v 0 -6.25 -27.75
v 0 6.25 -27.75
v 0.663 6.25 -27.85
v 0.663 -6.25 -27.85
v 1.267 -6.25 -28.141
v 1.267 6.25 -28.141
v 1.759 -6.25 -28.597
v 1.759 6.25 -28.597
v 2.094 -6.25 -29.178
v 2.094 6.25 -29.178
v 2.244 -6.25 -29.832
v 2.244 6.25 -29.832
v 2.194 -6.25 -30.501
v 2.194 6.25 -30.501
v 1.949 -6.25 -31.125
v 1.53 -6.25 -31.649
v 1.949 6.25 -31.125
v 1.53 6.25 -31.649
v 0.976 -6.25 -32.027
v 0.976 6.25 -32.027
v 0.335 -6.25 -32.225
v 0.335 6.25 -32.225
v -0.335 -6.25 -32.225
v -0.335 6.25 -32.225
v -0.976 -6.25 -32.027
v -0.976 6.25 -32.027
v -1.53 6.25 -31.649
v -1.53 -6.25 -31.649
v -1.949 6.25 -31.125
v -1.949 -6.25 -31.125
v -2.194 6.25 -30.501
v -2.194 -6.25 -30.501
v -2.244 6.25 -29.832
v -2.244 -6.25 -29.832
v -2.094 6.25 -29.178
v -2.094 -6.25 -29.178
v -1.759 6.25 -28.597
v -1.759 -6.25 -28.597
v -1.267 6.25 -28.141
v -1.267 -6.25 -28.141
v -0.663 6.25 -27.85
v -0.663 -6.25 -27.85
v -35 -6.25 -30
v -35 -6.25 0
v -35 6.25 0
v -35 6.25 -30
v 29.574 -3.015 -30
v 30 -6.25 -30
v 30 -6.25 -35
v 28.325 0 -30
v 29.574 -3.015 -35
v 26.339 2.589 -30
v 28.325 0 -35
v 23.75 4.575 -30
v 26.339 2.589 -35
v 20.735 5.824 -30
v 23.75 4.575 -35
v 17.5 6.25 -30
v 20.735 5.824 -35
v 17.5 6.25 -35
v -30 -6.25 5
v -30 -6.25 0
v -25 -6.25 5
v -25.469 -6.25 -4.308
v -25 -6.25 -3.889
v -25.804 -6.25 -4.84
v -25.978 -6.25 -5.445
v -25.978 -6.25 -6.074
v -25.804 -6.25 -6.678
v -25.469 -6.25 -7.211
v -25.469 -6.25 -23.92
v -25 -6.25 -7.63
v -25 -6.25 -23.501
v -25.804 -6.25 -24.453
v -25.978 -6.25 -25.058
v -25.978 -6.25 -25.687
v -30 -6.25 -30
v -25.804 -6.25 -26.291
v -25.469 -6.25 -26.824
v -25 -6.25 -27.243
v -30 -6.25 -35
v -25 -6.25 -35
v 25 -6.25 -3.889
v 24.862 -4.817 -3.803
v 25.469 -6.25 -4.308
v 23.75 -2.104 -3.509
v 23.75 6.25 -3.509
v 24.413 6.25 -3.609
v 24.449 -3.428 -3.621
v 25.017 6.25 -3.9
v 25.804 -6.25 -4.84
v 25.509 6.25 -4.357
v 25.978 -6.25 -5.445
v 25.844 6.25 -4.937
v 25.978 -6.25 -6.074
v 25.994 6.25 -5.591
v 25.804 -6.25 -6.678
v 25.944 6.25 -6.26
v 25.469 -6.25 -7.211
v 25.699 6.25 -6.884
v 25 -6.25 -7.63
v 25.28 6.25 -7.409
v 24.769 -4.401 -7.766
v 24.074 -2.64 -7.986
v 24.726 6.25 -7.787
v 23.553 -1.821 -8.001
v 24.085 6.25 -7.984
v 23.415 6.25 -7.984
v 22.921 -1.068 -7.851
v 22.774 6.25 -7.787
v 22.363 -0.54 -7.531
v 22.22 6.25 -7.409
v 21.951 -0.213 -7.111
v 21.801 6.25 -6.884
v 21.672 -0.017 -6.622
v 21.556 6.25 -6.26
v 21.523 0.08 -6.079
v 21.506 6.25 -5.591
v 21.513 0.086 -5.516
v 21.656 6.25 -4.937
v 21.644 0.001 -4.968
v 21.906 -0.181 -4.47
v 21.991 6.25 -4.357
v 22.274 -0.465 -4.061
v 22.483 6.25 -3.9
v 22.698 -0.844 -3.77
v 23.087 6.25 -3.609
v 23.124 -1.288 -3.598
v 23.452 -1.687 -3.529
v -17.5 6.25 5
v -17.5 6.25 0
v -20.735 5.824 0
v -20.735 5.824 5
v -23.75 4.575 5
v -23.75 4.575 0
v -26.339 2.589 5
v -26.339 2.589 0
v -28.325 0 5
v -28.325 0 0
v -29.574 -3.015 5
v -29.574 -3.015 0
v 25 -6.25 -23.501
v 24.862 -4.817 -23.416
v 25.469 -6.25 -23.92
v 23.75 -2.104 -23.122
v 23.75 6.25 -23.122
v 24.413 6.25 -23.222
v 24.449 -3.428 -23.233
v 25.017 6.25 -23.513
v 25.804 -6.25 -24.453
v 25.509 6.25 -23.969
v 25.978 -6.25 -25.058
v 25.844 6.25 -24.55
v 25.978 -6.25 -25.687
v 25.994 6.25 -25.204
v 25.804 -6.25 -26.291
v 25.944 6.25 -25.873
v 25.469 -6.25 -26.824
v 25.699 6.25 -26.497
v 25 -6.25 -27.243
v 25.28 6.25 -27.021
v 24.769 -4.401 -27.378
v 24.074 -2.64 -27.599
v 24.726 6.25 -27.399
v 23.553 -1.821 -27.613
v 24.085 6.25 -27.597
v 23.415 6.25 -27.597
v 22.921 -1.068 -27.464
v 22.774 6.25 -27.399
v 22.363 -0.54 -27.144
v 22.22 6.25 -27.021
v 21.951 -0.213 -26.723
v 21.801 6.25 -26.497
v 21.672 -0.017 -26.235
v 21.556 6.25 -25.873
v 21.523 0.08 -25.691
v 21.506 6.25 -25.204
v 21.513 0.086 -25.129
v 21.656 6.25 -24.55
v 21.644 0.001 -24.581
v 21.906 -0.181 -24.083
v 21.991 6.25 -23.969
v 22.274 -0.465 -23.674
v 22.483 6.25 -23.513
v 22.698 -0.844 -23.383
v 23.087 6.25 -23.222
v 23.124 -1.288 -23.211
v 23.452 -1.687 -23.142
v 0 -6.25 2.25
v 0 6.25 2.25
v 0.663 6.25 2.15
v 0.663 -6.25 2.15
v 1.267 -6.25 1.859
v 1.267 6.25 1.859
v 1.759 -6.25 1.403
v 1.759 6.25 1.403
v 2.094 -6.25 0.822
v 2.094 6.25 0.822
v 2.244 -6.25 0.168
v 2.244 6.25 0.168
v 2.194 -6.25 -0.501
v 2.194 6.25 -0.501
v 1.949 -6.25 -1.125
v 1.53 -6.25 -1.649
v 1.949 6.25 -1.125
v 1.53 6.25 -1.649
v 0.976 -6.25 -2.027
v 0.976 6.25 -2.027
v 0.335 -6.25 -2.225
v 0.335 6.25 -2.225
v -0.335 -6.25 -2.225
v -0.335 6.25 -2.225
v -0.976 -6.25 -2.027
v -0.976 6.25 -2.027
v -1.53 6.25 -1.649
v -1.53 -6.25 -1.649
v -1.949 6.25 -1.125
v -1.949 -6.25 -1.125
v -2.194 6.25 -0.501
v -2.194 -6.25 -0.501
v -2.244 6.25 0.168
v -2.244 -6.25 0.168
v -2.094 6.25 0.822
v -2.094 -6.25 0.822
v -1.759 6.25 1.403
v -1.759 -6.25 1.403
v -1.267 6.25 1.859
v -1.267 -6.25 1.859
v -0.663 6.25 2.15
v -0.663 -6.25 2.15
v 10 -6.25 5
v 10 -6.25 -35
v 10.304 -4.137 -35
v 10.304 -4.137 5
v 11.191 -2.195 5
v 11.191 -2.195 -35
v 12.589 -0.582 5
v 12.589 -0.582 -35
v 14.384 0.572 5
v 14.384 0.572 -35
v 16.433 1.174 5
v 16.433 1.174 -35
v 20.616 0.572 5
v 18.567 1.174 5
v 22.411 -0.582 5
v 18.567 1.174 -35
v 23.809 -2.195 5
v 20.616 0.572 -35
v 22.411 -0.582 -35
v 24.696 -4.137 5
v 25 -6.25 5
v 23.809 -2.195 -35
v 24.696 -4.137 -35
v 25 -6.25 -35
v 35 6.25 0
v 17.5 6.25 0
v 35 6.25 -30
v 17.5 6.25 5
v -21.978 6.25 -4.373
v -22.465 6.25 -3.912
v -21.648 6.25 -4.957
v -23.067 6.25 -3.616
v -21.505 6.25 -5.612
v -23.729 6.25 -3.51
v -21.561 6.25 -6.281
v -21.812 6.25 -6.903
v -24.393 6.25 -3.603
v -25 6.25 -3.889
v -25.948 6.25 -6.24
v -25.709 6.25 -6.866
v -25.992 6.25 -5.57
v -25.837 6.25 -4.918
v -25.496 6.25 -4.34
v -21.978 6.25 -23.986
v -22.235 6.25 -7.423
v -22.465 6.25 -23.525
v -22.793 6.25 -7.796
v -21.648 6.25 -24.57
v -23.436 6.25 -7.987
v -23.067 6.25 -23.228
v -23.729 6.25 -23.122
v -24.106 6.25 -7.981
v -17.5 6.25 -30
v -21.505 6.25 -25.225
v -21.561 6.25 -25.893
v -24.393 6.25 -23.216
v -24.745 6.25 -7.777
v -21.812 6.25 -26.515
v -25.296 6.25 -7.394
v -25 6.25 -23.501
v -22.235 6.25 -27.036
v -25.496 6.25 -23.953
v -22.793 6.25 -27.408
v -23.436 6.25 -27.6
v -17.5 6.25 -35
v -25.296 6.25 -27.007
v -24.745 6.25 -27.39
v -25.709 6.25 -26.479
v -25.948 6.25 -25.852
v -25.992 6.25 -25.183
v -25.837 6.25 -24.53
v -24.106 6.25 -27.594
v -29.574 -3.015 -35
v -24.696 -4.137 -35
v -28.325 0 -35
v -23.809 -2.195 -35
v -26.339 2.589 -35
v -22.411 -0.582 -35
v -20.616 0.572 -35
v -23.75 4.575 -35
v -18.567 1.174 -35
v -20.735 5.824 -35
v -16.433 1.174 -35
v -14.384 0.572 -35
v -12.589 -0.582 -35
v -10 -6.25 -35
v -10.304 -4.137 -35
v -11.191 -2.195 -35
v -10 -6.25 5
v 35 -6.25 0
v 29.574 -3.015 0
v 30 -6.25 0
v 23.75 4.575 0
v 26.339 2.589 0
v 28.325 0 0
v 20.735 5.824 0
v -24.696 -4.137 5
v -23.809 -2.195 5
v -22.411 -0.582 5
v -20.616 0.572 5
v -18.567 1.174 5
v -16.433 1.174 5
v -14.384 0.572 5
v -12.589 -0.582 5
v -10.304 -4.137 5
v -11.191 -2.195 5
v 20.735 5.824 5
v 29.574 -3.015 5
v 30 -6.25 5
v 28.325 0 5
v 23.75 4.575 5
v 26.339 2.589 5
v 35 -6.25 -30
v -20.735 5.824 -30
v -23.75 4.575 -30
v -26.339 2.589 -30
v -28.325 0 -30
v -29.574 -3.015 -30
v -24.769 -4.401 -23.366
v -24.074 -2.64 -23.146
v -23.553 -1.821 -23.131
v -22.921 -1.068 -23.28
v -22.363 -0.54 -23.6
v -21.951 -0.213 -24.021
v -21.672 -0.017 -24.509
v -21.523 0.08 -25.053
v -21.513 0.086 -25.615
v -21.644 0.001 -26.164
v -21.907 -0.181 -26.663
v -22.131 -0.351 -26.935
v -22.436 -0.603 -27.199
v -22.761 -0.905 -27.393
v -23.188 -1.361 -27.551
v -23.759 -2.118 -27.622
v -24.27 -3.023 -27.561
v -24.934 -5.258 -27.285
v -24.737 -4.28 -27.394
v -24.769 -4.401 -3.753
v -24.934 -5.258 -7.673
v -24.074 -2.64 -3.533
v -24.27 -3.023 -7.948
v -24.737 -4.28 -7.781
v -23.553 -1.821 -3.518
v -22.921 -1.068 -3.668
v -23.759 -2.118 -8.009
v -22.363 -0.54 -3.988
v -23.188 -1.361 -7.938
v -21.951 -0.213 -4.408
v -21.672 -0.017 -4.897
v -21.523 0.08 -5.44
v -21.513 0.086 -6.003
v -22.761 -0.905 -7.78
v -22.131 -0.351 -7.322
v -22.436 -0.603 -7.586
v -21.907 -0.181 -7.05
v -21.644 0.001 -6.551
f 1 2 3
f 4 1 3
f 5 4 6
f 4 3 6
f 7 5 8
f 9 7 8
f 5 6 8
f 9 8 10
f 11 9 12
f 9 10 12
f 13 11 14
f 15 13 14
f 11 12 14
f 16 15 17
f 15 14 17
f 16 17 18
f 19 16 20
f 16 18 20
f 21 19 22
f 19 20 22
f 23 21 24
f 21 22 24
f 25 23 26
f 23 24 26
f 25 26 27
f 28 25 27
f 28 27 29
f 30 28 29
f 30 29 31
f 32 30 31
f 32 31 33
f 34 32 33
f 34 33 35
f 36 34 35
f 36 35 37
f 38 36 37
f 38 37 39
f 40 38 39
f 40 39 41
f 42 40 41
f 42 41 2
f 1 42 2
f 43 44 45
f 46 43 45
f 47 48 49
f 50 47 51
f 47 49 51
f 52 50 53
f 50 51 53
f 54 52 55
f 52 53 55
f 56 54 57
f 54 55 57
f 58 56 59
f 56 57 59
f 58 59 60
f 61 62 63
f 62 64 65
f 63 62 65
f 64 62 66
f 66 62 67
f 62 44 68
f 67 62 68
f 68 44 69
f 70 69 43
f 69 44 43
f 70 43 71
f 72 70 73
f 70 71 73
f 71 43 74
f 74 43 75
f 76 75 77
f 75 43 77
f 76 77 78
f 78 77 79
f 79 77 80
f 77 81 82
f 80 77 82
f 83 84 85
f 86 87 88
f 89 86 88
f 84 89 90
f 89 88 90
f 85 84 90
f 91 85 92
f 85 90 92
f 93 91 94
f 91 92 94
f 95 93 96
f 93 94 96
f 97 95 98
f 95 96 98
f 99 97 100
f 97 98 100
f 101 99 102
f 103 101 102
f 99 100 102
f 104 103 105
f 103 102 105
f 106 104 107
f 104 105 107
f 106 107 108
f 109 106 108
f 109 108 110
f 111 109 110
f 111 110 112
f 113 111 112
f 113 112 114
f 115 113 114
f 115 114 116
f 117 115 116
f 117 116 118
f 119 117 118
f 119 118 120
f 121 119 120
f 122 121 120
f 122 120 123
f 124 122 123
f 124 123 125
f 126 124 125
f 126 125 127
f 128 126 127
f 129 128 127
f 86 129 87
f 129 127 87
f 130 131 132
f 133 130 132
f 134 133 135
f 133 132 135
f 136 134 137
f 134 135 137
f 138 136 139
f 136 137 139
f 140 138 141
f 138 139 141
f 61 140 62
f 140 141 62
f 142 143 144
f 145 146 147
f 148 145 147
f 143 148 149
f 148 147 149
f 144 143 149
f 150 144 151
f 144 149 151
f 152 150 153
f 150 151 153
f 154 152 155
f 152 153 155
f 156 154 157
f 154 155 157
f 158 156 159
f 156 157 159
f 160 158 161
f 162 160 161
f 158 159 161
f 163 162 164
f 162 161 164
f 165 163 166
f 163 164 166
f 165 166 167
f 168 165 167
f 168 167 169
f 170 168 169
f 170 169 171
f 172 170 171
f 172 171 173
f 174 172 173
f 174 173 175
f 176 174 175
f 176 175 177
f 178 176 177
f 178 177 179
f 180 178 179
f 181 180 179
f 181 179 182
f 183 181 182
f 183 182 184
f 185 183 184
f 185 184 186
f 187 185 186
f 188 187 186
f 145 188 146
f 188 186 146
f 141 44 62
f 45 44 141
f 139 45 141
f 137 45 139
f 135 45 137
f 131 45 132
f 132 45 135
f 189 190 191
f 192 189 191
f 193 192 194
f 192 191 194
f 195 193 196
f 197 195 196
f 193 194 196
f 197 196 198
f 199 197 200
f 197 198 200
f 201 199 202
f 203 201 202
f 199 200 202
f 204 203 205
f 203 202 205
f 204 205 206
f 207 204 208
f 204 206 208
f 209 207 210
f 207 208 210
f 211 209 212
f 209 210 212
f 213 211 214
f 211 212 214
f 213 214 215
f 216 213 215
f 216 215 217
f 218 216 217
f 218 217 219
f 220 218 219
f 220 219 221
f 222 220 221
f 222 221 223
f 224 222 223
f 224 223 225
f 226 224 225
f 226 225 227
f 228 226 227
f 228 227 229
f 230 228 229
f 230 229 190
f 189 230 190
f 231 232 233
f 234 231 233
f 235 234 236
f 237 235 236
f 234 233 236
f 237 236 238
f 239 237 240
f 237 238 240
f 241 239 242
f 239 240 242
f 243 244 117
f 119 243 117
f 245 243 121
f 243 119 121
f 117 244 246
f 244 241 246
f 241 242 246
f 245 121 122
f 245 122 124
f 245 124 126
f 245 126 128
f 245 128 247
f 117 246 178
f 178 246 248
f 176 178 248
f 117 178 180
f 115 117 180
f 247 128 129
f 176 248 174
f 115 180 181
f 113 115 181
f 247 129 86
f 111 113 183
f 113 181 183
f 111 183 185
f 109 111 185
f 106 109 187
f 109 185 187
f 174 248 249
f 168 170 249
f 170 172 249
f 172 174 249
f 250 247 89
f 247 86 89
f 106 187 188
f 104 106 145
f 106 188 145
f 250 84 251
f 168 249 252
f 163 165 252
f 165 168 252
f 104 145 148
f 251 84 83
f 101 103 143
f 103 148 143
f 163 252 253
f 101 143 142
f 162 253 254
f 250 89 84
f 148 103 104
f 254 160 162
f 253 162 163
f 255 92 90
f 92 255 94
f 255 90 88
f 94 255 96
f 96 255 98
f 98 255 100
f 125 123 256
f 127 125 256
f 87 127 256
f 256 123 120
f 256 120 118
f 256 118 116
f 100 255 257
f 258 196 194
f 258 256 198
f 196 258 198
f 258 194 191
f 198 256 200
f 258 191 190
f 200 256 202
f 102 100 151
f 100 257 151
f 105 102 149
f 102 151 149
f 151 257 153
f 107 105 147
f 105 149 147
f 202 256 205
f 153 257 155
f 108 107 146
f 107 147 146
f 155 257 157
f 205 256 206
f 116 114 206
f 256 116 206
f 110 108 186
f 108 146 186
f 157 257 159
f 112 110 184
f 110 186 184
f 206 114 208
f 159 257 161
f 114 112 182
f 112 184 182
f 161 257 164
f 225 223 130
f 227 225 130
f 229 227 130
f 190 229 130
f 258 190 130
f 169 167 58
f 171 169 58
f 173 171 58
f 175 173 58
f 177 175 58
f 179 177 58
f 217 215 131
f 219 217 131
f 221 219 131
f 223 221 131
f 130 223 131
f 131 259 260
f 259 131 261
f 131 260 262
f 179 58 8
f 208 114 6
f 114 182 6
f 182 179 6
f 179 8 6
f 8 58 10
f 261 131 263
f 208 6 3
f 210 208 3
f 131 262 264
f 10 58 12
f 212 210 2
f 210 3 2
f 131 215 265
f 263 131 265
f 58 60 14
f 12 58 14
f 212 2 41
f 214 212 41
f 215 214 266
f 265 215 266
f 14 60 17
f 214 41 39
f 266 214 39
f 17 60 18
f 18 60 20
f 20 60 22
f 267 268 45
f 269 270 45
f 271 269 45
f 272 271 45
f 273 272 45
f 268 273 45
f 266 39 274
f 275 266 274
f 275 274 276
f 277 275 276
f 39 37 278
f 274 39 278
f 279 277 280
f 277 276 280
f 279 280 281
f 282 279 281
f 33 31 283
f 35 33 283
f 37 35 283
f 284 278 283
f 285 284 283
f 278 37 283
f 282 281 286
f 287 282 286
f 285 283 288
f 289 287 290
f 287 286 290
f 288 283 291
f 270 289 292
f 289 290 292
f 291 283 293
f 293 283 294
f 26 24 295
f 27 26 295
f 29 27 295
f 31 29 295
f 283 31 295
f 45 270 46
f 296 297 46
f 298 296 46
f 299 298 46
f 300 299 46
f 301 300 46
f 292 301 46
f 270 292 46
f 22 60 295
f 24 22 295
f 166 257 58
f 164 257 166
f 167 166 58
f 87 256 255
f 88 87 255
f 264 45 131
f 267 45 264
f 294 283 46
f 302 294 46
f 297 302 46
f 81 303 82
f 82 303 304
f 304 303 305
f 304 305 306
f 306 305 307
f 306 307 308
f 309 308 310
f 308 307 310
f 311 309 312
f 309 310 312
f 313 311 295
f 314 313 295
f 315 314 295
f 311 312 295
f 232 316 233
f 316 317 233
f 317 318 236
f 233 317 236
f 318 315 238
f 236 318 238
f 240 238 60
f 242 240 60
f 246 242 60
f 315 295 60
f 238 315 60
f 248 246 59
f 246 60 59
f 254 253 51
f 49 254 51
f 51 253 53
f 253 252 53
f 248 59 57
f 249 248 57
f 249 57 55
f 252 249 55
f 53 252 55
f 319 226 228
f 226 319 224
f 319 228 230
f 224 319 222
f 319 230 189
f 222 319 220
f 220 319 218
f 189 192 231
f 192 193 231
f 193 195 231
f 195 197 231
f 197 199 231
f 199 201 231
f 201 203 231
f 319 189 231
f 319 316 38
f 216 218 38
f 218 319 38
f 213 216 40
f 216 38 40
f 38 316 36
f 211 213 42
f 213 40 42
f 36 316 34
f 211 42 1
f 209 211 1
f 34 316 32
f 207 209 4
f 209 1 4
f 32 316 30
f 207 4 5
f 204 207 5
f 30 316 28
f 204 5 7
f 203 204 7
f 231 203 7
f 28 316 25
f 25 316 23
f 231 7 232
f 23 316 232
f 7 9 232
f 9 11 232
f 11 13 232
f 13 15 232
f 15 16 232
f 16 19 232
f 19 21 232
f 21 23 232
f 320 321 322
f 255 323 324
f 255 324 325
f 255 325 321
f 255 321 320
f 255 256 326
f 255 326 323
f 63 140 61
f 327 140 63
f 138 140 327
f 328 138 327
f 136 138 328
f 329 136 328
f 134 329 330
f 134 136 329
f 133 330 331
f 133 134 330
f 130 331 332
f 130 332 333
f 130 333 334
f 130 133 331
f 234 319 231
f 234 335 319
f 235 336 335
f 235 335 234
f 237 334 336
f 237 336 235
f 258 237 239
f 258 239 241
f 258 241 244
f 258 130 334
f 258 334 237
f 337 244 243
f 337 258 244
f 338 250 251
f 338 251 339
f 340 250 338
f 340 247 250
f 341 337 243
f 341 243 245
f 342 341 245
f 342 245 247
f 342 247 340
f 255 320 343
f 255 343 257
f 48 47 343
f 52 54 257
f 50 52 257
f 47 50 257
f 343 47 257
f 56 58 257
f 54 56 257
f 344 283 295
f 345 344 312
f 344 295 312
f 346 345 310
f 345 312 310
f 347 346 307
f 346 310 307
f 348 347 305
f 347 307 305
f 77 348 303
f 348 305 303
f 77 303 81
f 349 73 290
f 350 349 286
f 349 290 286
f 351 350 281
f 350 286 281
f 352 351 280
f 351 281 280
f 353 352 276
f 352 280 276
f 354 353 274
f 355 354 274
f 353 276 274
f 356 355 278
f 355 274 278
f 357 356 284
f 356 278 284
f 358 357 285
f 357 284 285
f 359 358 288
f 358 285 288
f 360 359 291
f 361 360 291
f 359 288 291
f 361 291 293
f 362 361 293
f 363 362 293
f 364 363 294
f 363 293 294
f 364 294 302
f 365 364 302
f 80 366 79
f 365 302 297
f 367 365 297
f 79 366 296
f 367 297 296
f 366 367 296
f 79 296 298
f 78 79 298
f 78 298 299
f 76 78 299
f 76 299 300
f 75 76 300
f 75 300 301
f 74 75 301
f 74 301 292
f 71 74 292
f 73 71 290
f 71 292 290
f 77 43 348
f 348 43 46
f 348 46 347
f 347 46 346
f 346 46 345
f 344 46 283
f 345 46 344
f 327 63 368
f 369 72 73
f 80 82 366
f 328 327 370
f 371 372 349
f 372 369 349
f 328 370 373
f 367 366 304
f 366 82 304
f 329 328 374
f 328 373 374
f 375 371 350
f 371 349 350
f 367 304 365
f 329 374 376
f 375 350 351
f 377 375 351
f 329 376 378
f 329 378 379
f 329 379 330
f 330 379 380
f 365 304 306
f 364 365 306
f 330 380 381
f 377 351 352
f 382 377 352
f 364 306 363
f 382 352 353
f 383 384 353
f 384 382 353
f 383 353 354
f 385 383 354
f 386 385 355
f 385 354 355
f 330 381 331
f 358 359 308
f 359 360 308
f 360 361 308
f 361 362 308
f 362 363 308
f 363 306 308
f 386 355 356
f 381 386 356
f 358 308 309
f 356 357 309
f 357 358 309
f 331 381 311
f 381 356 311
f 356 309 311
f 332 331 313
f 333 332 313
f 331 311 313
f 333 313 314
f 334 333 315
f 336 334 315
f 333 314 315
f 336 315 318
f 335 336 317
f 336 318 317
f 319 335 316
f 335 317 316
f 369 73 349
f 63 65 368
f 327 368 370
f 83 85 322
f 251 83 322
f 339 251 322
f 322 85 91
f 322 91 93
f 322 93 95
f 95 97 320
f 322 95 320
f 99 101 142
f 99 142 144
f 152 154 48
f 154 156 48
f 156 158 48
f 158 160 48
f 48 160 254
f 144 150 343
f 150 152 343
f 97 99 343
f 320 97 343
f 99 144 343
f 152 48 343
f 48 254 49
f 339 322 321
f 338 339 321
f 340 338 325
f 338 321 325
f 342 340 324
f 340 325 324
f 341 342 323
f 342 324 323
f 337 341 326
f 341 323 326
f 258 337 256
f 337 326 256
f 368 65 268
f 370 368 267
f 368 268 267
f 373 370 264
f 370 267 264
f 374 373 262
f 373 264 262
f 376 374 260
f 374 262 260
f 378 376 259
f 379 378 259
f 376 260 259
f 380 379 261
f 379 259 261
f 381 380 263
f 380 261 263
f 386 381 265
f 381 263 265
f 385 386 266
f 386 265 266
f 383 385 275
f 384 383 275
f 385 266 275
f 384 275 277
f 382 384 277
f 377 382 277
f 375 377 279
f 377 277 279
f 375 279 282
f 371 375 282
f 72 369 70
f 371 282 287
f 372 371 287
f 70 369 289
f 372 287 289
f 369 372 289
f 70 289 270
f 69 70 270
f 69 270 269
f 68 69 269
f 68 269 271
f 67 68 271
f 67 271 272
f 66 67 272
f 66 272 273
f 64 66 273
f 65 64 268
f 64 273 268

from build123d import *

# Parameters (mm, degrees)
SKETCH1_W                = 70
SKETCH1_H                = 12.5
BOSS_EXTRUDE1_DEPTH      = 30
BOSS_EXTRUDE3_DEPTH      = 5
BOSS_EXTRUDE3_DEPTH_BACK = 35
CUT_EXTRUDE1_START       = -66
CUT_EXTRUDE1_DEPTH       = 66
SKETCH7_R                = 2.25
CUT_EXTRUDE2_DEPTH       = 66


with BuildPart() as part:
    # Sketch1 → Boss-Extrude1 (new body)
    with BuildSketch(Plane.XY):
        Rectangle(SKETCH1_W, SKETCH1_H)
    extrude(amount=-BOSS_EXTRUDE1_DEPTH)

    # Sketch2 → Boss-Extrude3 (add, two sides: drawn at the far end of the back side and taken through both)
    with BuildSketch(Plane.XY.offset(-BOSS_EXTRUDE3_DEPTH_BACK)):
        with BuildLine():
            Line((-10, -6.25), (10, -6.25))
            ThreePointArc((10, -6.25), (17.5, 1.25), (25, -6.25))
            Line((25, -6.25), (30, -6.25))
            ThreePointArc((30, -6.25), (26.338834765, 2.588834765), (17.5, 6.25))
            Line((17.5, 6.25), (-17.5, 6.25))
            ThreePointArc((-17.5, 6.25), (-26.338834765, 2.588834765), (-30, -6.25))
            Line((-30, -6.25), (-25, -6.25))
            ThreePointArc((-25, -6.25), (-17.5, 1.25), (-10, -6.25))
        make_face()
    extrude(amount=BOSS_EXTRUDE3_DEPTH + BOSS_EXTRUDE3_DEPTH_BACK)

    # Sketch5 → Cut-Extrude1 (cut)
    with BuildSketch(Plane.XY.offset(5).offset(CUT_EXTRUDE1_START)):
        with BuildLine():
            Line((-25, -6.25), (-10, -6.25))
            ThreePointArc((-10, -6.25), (-17.5, 1.25), (-25, -6.25))
        make_face()
        with BuildLine():
            Line((10, -6.25), (25, -6.25))
            ThreePointArc((25, -6.25), (17.5, 1.25), (10, -6.25))
        make_face()
    extrude(amount=CUT_EXTRUDE1_DEPTH, mode=Mode.SUBTRACT)

    # Sketch7 → Cut-Extrude2 (cut)
    with BuildSketch(Plane(origin=(0, 6.25, 0), x_dir=(1, 0, 0), z_dir=(0, 1, 0))):
        with Locations(Location((0, 0, 0), (0, 0, 270))):
            Circle(SKETCH7_R)
        with Locations(Location((0, 30, 0), (0, 0, 270))):
            Circle(SKETCH7_R)
        with Locations(Location((23.75, 25.372099054, 0), (0, 0, 270))):
            Circle(SKETCH7_R)
        with Locations(Location((23.75, 5.759402661, 0), (0, 0, 270))):
            Circle(SKETCH7_R)
        with Locations(Location((-23.75, 25.372099054, 0), (0, 0, 236.251011404))):
            Circle(SKETCH7_R)
        with Locations(Location((-23.75, 5.759402661, 0), (0, 0, 236.251011404))):
            Circle(SKETCH7_R)
    extrude(amount=-CUT_EXTRUDE2_DEPTH, mode=Mode.SUBTRACT)


solid = part.part
